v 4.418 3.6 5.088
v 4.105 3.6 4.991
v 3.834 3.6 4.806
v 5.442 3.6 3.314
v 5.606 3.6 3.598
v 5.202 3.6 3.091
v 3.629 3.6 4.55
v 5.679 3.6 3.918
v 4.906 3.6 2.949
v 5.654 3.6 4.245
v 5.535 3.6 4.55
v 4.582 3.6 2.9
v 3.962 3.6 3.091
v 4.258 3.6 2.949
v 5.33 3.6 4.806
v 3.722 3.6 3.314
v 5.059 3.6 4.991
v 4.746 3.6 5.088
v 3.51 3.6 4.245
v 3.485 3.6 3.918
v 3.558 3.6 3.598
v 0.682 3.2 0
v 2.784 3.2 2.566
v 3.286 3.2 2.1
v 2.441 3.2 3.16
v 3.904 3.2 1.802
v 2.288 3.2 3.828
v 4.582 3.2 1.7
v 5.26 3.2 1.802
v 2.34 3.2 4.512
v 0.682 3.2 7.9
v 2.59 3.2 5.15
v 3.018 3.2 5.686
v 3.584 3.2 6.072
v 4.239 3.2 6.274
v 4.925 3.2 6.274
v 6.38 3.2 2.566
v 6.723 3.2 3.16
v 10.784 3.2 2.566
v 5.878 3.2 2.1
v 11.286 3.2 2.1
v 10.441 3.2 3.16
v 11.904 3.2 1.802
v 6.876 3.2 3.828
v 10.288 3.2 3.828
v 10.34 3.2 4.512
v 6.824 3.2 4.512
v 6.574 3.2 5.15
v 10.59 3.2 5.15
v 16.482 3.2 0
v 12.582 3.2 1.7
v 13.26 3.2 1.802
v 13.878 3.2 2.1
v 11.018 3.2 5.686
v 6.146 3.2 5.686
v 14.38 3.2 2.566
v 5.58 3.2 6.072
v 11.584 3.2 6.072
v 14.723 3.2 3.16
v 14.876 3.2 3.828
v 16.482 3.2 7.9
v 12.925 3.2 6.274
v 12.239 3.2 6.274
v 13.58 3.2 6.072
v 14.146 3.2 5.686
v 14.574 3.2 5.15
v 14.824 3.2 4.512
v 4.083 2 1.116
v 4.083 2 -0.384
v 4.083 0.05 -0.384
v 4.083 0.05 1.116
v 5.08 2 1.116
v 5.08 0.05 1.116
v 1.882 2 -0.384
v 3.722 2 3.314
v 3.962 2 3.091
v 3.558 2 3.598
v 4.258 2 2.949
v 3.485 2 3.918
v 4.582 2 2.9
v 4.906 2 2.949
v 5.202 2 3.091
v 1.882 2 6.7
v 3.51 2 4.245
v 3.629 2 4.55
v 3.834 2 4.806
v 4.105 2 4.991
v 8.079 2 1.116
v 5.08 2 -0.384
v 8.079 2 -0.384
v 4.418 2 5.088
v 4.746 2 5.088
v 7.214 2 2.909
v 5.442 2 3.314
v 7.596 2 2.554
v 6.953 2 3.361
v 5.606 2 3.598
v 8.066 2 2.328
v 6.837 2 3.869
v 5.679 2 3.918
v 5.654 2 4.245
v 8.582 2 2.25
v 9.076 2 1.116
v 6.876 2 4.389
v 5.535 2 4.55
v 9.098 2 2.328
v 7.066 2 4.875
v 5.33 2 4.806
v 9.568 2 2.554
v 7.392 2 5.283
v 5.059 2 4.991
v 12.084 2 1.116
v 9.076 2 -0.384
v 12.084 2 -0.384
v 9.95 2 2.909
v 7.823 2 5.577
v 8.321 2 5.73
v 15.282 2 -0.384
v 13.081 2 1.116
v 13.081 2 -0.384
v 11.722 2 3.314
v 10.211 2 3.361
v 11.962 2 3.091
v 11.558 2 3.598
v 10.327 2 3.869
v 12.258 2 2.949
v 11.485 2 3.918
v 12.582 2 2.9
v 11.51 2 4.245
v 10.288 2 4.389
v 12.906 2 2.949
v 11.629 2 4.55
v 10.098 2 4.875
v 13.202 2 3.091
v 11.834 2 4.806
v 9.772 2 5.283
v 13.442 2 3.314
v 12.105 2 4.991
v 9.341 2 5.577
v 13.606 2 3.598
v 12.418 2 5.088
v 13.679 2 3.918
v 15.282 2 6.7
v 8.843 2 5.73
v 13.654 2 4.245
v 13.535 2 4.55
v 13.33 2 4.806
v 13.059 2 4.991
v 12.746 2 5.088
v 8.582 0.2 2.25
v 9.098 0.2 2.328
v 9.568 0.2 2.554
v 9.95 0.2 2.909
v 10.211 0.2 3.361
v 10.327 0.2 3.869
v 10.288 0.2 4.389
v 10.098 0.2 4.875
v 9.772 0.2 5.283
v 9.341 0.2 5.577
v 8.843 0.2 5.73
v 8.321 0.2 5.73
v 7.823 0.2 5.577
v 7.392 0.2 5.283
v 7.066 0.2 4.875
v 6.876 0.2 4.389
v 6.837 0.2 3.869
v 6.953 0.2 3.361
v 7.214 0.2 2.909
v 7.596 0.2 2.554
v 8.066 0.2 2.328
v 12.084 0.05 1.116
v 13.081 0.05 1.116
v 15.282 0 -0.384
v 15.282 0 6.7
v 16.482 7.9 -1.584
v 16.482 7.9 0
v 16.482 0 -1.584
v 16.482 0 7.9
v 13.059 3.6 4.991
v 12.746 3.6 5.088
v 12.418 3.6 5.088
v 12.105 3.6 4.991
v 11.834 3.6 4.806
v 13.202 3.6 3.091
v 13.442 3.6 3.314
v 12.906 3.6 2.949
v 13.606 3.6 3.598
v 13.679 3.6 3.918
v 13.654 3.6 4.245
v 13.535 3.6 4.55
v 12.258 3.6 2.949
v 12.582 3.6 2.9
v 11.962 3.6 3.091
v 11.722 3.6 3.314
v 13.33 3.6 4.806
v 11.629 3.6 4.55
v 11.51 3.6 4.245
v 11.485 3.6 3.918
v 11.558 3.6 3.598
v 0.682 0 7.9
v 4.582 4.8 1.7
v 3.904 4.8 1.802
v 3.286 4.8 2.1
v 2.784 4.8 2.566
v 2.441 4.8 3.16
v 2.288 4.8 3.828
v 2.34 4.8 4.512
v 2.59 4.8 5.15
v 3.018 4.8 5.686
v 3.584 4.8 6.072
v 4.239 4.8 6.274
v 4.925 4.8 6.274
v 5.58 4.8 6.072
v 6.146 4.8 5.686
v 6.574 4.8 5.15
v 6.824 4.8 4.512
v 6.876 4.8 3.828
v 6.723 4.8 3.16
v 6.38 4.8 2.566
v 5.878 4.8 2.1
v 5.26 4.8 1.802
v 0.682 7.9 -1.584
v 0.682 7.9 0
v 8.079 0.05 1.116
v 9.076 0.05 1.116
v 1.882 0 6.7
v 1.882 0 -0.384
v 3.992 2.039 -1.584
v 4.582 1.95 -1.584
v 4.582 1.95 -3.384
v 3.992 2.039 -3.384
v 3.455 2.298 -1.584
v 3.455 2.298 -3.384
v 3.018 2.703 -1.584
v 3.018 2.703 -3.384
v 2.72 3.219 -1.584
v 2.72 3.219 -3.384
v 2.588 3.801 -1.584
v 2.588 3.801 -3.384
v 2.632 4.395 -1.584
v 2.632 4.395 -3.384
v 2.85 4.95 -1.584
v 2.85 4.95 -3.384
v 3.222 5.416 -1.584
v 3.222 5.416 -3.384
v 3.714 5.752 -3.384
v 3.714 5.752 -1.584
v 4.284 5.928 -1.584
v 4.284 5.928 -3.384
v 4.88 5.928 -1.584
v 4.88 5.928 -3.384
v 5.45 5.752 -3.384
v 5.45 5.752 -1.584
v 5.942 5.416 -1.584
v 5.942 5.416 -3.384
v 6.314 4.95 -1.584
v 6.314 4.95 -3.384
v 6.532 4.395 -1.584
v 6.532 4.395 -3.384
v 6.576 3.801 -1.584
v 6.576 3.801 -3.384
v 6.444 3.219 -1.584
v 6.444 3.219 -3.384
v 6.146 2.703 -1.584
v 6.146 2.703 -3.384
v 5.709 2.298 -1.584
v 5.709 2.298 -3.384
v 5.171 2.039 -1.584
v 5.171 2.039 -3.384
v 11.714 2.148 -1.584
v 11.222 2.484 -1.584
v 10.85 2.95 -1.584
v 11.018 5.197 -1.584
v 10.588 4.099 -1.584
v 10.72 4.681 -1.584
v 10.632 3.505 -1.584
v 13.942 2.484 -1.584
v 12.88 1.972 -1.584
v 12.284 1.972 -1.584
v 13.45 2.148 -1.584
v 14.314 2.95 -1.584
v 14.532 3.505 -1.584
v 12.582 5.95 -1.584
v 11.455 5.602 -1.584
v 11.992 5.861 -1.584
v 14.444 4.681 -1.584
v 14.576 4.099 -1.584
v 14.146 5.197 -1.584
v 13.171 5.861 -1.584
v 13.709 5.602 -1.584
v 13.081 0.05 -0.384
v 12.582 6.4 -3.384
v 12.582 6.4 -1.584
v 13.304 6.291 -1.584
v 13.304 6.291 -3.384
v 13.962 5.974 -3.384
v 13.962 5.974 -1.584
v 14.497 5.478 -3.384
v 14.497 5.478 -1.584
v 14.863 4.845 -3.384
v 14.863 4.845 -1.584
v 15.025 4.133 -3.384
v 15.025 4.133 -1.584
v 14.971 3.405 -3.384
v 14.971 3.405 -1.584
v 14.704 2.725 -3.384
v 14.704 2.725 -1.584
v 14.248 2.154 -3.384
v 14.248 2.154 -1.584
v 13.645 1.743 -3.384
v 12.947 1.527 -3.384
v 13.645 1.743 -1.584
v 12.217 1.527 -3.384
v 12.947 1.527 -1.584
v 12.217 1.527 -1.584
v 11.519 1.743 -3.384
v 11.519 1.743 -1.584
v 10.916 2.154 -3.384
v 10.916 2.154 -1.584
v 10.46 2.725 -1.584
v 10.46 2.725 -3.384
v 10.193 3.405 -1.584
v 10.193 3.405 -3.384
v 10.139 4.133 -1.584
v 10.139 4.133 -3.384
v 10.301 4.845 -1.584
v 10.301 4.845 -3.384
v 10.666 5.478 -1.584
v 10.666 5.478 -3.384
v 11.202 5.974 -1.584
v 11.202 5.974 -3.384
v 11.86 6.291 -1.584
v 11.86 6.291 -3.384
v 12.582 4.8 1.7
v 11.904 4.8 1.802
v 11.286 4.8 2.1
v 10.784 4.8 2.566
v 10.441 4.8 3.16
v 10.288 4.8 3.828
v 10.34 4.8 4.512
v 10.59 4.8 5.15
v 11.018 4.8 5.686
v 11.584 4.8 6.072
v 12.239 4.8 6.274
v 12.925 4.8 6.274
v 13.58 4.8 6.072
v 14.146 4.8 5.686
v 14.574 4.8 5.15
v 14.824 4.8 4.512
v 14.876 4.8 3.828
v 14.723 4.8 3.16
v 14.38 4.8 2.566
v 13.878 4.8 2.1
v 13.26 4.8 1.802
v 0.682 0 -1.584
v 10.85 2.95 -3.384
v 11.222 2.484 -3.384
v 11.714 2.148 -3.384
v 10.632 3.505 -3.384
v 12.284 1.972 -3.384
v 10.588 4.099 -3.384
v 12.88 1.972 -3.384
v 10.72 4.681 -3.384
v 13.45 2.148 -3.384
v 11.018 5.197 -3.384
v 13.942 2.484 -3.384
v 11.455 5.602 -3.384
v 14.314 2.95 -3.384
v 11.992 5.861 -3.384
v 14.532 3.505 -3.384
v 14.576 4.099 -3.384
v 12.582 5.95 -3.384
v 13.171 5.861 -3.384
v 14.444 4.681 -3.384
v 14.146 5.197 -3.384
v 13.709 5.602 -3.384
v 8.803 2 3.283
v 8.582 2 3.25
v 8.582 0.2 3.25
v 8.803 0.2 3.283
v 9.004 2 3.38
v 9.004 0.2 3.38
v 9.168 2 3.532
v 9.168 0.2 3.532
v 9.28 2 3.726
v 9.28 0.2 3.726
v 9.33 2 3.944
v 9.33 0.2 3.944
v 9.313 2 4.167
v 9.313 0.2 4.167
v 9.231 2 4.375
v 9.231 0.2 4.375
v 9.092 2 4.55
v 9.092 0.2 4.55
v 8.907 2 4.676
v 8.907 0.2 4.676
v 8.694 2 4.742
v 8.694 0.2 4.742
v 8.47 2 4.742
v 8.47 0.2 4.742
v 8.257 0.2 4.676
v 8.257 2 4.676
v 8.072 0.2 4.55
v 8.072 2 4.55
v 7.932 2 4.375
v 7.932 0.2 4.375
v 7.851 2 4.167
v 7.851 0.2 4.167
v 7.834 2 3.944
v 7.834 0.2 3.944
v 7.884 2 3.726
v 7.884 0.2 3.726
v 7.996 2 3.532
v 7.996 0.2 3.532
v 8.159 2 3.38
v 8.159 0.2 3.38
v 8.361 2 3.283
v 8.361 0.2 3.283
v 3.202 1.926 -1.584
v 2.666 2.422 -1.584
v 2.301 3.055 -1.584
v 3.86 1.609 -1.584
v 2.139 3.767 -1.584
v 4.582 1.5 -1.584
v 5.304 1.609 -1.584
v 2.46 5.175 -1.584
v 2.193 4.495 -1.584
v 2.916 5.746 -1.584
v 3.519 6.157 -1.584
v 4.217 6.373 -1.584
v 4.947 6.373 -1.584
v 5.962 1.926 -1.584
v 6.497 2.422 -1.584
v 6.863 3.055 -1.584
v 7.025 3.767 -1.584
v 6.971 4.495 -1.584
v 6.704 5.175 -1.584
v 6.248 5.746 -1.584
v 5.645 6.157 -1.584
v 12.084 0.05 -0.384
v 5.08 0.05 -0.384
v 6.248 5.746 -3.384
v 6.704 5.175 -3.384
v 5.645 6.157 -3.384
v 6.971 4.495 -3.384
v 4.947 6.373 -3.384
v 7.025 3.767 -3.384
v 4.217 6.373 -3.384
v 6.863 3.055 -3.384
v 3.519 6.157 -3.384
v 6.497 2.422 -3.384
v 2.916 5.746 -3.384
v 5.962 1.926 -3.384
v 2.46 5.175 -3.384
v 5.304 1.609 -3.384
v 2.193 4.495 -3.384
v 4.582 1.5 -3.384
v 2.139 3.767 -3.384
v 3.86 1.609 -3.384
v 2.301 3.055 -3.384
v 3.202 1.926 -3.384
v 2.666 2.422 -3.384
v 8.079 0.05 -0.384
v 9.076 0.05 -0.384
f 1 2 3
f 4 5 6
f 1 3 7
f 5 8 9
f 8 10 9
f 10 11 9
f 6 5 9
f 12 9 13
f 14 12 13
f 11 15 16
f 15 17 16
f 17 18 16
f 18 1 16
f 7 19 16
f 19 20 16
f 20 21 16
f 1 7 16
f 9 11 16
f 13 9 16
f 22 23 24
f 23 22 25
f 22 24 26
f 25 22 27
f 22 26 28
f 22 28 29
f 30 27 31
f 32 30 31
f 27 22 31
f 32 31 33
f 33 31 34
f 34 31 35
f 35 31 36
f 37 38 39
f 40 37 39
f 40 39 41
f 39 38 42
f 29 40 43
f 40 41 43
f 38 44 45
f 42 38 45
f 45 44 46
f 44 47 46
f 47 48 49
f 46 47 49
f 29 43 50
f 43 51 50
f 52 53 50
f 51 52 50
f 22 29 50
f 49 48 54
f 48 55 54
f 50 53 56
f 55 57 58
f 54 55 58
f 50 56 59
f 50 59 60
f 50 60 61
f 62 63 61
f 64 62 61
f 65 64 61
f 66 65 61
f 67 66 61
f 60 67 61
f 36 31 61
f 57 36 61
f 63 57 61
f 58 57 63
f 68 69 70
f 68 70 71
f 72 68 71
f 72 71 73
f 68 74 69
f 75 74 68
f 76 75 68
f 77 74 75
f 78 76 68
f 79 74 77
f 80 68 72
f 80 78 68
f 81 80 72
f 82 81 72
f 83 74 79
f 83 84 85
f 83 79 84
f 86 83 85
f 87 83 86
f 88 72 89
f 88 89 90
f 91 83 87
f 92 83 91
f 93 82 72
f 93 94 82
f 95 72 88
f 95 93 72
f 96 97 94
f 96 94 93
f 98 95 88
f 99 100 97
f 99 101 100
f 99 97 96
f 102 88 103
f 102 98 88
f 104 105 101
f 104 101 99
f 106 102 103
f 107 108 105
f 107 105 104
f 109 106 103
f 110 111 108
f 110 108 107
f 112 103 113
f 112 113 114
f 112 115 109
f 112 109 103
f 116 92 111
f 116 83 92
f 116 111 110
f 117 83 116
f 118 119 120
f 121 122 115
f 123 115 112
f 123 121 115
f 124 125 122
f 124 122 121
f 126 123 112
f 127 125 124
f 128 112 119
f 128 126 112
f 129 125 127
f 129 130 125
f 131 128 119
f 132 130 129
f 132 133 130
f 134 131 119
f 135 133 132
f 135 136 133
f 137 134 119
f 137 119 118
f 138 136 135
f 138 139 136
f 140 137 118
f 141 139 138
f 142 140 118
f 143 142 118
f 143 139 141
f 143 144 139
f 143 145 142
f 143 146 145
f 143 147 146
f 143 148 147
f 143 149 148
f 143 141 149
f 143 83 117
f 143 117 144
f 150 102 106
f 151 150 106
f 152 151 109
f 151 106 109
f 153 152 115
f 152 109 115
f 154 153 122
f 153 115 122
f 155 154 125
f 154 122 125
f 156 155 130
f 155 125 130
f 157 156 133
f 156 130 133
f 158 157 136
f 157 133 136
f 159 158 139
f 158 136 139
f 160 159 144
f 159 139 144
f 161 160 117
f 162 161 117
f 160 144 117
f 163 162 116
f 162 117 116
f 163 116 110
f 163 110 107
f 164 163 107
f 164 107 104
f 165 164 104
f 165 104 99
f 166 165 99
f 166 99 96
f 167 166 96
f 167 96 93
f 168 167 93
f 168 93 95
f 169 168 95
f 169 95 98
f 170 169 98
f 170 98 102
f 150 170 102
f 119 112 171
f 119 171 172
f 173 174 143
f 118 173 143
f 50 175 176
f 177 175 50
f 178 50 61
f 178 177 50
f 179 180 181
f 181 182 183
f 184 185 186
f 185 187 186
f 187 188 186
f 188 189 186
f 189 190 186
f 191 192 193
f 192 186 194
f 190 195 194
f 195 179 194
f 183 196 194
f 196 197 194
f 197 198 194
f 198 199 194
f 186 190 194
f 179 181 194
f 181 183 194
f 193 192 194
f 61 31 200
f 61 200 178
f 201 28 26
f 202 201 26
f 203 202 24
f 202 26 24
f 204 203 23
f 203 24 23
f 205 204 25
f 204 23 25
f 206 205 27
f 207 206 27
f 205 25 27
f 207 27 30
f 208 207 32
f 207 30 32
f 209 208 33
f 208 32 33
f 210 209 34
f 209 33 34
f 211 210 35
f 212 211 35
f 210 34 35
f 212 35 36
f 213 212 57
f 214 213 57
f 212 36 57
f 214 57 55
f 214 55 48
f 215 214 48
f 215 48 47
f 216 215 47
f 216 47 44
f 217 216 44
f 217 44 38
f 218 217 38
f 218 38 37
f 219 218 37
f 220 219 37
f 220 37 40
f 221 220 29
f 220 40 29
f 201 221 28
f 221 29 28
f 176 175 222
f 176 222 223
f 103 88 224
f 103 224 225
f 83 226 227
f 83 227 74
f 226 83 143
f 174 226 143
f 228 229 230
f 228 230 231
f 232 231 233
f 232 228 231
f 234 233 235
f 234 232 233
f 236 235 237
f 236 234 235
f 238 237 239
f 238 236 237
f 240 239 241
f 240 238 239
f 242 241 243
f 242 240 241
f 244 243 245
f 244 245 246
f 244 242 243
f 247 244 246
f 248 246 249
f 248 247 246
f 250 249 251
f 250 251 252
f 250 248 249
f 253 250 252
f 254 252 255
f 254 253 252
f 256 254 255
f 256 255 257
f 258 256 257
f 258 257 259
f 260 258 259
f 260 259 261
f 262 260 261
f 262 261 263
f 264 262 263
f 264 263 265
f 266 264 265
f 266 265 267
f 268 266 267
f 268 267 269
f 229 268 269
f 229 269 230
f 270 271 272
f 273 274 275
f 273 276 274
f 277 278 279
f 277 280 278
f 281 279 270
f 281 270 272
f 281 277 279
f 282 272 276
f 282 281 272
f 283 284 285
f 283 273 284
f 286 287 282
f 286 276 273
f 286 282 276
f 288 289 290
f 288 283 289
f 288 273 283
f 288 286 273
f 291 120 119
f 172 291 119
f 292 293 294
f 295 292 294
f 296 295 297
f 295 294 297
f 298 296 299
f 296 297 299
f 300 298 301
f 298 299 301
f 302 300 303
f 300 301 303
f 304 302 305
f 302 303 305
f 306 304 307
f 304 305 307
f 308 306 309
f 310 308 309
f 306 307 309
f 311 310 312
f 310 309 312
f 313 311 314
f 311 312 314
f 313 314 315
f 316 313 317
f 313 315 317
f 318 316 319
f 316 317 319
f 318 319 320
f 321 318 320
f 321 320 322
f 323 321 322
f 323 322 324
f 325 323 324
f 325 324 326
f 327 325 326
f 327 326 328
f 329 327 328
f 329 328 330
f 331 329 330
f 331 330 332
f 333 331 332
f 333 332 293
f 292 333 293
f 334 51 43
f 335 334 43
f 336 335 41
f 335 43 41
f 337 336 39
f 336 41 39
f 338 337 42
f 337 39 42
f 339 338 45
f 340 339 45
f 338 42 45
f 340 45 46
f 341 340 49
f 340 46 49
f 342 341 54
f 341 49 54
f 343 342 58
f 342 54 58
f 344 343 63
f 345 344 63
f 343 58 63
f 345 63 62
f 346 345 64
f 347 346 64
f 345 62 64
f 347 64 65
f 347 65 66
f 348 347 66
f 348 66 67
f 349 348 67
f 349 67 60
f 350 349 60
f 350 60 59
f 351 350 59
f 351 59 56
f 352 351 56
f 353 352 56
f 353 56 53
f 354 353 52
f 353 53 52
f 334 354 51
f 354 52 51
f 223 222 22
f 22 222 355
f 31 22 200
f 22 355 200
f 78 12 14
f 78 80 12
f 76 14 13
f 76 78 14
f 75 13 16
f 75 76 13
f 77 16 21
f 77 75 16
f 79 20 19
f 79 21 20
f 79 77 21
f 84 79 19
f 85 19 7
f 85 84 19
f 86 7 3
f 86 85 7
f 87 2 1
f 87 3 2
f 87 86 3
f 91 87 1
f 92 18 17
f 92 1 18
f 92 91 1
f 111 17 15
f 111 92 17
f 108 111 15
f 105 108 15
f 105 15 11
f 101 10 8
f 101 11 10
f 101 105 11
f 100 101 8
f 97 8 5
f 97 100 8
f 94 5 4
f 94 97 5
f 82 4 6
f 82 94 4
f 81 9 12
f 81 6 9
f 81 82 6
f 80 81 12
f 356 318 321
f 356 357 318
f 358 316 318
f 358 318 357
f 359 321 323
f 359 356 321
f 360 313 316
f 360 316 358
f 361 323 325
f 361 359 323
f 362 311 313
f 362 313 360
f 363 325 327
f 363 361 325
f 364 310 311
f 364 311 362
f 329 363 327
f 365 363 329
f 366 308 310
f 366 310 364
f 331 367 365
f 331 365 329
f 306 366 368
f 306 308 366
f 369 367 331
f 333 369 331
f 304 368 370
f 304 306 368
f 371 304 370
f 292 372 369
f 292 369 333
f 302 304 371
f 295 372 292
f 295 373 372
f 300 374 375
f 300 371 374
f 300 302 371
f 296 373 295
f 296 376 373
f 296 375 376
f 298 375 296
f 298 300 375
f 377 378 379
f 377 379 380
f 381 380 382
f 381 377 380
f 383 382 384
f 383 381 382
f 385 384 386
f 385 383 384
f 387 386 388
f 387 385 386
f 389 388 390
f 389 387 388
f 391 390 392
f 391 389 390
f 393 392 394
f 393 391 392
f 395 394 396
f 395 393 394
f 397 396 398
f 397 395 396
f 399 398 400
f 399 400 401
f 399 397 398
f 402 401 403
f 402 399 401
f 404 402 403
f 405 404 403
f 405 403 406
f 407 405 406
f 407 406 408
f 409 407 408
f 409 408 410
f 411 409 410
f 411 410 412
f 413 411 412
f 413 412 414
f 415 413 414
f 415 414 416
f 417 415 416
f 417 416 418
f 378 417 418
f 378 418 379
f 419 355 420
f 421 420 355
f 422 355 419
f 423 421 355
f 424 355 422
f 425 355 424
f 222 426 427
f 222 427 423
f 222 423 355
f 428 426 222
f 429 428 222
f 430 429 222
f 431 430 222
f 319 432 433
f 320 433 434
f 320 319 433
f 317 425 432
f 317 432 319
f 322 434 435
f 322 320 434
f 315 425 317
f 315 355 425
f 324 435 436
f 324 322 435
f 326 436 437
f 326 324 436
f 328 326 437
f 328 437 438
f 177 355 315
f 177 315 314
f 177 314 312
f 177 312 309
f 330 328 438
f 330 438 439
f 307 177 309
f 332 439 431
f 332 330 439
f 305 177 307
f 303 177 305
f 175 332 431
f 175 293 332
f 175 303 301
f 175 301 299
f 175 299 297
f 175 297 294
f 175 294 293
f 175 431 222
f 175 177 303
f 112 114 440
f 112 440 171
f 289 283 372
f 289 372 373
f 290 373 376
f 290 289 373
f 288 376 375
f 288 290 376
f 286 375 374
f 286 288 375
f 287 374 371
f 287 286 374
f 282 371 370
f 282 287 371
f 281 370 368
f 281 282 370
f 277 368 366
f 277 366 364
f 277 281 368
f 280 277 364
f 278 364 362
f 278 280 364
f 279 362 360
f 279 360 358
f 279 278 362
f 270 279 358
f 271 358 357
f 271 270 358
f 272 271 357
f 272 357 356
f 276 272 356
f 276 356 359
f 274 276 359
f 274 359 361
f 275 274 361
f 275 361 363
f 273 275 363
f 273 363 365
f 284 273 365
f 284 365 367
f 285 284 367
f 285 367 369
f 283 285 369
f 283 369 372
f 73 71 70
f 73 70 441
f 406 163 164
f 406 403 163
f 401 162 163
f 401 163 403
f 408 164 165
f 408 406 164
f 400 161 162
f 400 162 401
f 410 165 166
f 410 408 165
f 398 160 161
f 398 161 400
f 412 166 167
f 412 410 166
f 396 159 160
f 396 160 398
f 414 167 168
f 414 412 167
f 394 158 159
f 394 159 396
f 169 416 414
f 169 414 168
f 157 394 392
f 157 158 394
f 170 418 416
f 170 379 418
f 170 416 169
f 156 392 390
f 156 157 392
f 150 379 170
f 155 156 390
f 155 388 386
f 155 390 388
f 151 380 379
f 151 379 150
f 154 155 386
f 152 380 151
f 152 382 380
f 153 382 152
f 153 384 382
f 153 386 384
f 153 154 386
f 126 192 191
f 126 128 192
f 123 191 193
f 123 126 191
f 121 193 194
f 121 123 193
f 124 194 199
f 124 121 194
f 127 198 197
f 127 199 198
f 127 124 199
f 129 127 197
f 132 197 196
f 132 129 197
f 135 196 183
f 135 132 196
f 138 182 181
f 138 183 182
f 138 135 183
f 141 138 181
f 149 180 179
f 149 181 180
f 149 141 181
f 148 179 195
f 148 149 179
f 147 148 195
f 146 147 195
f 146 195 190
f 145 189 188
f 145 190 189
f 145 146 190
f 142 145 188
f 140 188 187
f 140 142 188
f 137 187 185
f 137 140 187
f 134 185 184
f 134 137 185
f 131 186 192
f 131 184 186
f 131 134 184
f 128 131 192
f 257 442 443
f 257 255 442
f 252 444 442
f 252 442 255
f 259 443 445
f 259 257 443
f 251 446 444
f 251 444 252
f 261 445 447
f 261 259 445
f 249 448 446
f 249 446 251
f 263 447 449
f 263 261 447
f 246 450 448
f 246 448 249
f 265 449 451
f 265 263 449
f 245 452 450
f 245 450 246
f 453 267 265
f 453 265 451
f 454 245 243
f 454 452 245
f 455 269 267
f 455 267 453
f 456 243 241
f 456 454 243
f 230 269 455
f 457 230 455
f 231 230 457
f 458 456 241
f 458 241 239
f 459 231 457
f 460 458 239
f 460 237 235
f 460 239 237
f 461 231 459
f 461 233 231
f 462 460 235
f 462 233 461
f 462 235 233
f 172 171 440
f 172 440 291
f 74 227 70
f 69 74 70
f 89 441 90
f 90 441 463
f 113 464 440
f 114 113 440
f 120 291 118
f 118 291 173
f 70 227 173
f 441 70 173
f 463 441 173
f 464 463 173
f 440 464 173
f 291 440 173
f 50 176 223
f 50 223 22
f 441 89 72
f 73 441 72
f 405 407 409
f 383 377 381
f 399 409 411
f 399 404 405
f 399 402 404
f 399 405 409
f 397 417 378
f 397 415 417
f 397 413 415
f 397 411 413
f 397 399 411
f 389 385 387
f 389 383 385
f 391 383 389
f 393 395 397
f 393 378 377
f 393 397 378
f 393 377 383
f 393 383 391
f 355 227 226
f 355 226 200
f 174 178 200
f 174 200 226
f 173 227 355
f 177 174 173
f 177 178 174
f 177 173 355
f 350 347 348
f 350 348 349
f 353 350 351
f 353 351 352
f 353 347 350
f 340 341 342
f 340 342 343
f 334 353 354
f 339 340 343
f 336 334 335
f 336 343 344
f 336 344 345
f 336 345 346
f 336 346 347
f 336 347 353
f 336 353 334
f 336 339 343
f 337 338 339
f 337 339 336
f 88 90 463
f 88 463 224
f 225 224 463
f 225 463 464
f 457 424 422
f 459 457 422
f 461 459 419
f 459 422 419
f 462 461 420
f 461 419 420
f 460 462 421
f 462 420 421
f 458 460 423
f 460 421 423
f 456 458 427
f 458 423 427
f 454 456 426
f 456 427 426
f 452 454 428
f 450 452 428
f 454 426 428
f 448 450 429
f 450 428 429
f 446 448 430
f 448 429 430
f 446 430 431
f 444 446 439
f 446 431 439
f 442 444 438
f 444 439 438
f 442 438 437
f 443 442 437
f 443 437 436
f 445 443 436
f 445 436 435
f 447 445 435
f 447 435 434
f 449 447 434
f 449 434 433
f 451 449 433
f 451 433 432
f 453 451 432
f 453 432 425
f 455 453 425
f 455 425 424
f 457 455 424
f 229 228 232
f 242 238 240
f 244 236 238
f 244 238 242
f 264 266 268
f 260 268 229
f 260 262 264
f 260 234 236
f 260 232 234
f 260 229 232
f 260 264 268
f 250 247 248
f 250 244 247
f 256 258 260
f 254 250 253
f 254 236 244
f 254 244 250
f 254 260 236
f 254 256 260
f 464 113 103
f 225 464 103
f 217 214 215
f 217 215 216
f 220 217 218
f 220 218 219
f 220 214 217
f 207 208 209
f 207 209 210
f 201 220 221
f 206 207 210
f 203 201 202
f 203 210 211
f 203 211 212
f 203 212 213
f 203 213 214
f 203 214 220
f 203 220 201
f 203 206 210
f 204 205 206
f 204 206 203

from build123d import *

# Parameters (mm, degrees)
MAINBASESKETCH_W             = 15.8
MAINBASESKETCH_H             = 3.2
MAINBASEEXTRUDE_DEPTH        = 7.9
STUDSSKETCH_R                = 2.3
STUDSEXTRUDE_DEPTH           = 1.6
STUDSPATTERN_COUNT           = 2
STUDSPATTERN_PITCH           = 8
STUDSPATTERN_COUNT_DIR2      = 2
STUDSPATTERN_PITCH_DIR2      = 8
MAINBASESHELL_T              = -1.2
LCUTBLUE_DEPTH               = 19.555463972
LCUTBLUE_DEPTH_BACK          = 19.555463972
CUTADDEDTOLCUT_DEPTH         = 2
MADESLIMCUTSKETCH_W          = 7.9
MADESLIMCUTSKETCH_H          = 7.9
MADESLIMCUT_DEPTH            = 19.897228453
MADESLIMFILLEXT_REACH        = 20.897
SKETCH33_W                   = 5.500952983
SKETCH33_H                   = 1.199047018
SLIMHOLEEXT_START            = -0.2
SLIMHOLESKETCH_R             = 1.75
SLIMHOLESKETCH_R_2           = 0.75
SLIMHOLEEXT_DEPTH            = 2
SHORTLEXTENSIONSKETCH_W      = 1.583745828
SHORTLEXTENSIONSKETCH_H      = 7.9
SHORTLEXTENDEDCUTSKETCH_W    = 13.4
SHORTLEXTENDEDCUTSKETCH_H    = 1.582792846
SHORTLEXTENDEDCUT_DEPTH      = 2
SHORTLUNDERSTUMPS_START      = -0.2
SHORTLUNDERSTUMPSKETCH_W     = 0.996828098
SHORTLUNDERSTUMPSKETCH_H     = 1.5
SHORTLUNDERSTUMPS_DEPTH      = 2.15
SHORTLUPPERCIRCLES_START     = -0.2
SHORTLUPPERCIRCLESSKETCH_R   = 2.45
SHORTLUPPERCIRCLESSKETCH_R_2 = 2
SHORTLUPPERCIRCLES_DEPTH     = 2


with BuildPart() as part:
    # MainBaseSketch → MainBaseExtrude (new, symmetric)
    with BuildSketch(Plane.XY):
        with Locations((8.581967213, 1.6)):
            Rectangle(MAINBASESKETCH_W, MAINBASESKETCH_H)
    extrude(amount=MAINBASEEXTRUDE_DEPTH, both=True)

    # StudsSketch → StudsExtrude (add)
    with BuildSketch(Plane(origin=(0, 3.2, 0), x_dir=(1, 0, 0), z_dir=(0, 1, 0))):
        with Locations(Location((4.581967213, 4, 0), (0, 0, 90))):
            Circle(STUDSSKETCH_R)
    studsextrude = extrude(amount=STUDSEXTRUDE_DEPTH)

    # StudsPattern: StudsExtrude 2 × 2
    with Locations(*[(j * STUDSPATTERN_PITCH_DIR2, 0, i * STUDSPATTERN_PITCH) for i in range(STUDSPATTERN_COUNT) for j in range(STUDSPATTERN_COUNT_DIR2) if (i, j) != (0, 0)]):
        add(studsextrude)

    # MainBaseShell
    mainbaseshell_openings = [part.faces().sort_by_distance(p)[0] for p in [
        (8.581967213, 0, 0),
    ]]
    offset(amount=MAINBASESHELL_T, openings=mainbaseshell_openings, kind=Kind.INTERSECTION)

    # LCUTBlueSketch → LCutBlue (cut, two sides: drawn at the far end of the back side and taken through both)
    with BuildSketch(Plane(origin=(0, 3.2, 0), x_dir=(1, 0, 0), z_dir=(0, 1, 0)).offset(-LCUTBLUE_DEPTH_BACK)):
        Polygon((8.581967213, 53.229874044), (8.581967213, 7.9), (8.581967213, 0), (16.481967213, 0), (61.811841258, 0), (125.917963912, 64.106122654), (72.688089868, 117.335996699), align=None)
    extrude(amount=LCUTBLUE_DEPTH + LCUTBLUE_DEPTH_BACK, mode=Mode.SUBTRACT)

    # CutAddedtoLSketch → CutAddedToLCut (add)
    with BuildSketch(Plane.XZ):
        Polygon((7.382920196, -6.7), (8.581967213, -6.7), (8.581967213, 0), (15.281967213, 0), (15.281967213, 1.199047018), (7.382920196, 1.199047018), (7.382920196, 0), align=None)
    extrude(amount=-CUTADDEDTOLCUT_DEPTH)

    # MadeSlimCutSketch → MadeSlimCut (cut, through all)
    with BuildSketch(Plane.XZ):
        with Locations((4.631967213, -3.95)):
            Rectangle(MADESLIMCUTSKETCH_W, MADESLIMCUTSKETCH_H)
    extrude(amount=-MADESLIMCUT_DEPTH, mode=Mode.SUBTRACT)

    # Sketch33 → MadeSlimFillExt (add, up to next)
    with BuildSketch(Plane.XZ, mode=Mode.PRIVATE) as madeslimfillext_sk1:
        with Locations((4.632443704, 0.599523509)):
            Rectangle(SKETCH33_W, SKETCH33_H)
    madeslimfillext_tool1 = extrude(madeslimfillext_sk1.sketch, amount=-MADESLIMFILLEXT_REACH, mode=Mode.PRIVATE) - part.part
    add(madeslimfillext_tool1.solids().sort_by_distance((4.632444, 0, 0.599524))[0])

    # SlimHoleSketch → SlimHoleExt (add)
    with BuildSketch(Plane.XZ.offset(-2).offset(SLIMHOLEEXT_START)):
        with Locations(Location((8.581967213, 4, 0), (0, 0, 270))):
            Circle(SLIMHOLESKETCH_R)
        with Locations(Location((8.581967213, 4, 0), (0, 0, 270))):
            Circle(SLIMHOLESKETCH_R_2, mode=Mode.SUBTRACT)
    extrude(amount=SLIMHOLEEXT_DEPTH)

    # ShortLExtension: sweep along a curve in space
    with BuildLine() as shortlextension_path:
        Line((0.681967213, 3.2, 0), (16.481967213, 3.2, 0))
    # ShortLExtensionSketch → ShortLExtension (sweep)
    with BuildSketch(Plane(origin=(16.481967213, 0, 0), x_dir=(0, 0, -1), z_dir=(1, 0, 0))):
        with Locations((0.791872914, 3.95)):
            Rectangle(SHORTLEXTENSIONSKETCH_W, SHORTLEXTENSIONSKETCH_H)
    sweep(path=shortlextension_path.line)

    # ShortLExtendedCutSketch → ShortLExtendedCut (cut)
    with BuildSketch(Plane.XZ):
        with Locations((8.581967213, 0.407650595)):
            Rectangle(SHORTLEXTENDEDCUTSKETCH_W, SHORTLEXTENDEDCUTSKETCH_H)
    extrude(amount=-SHORTLEXTENDEDCUT_DEPTH, mode=Mode.SUBTRACT)

    # ShortLUnderStumpSketch → ShortLUnderStumps (add)
    with BuildSketch(Plane.XZ.offset(-2).offset(SHORTLUNDERSTUMPS_START)):
        with Locations((4.581764801, 0.366254172)):
            Rectangle(SHORTLUNDERSTUMPSKETCH_W, SHORTLUNDERSTUMPSKETCH_H)
        with Locations((8.57767054, 0.366254172)):
            Rectangle(SHORTLUNDERSTUMPSKETCH_W, SHORTLUNDERSTUMPSKETCH_H)
        with Locations((12.582169625, 0.366254172)):
            Rectangle(SHORTLUNDERSTUMPSKETCH_W, SHORTLUNDERSTUMPSKETCH_H)
    extrude(amount=SHORTLUNDERSTUMPS_DEPTH)

    # ShortLUpperCirclesSketch → ShortLUpperCircles (add)
    # profile 1 of 2: a face of its own
    with BuildSketch(Plane(origin=(0, 0, -1.583745828), x_dir=(-1, 0, 0), z_dir=(0, 0, -1)).offset(SHORTLUPPERCIRCLES_START)):
        with Locations(Location((-12.581967213, 3.95, 0), (0, 0, 90))):
            Circle(SHORTLUPPERCIRCLESSKETCH_R)
        with Locations(Location((-12.581967213, 3.95, 0), (0, 0, 90))):
            Circle(SHORTLUPPERCIRCLESSKETCH_R_2, mode=Mode.SUBTRACT)
    # profile 2 of 2: a face of its own
    with BuildSketch(Plane(origin=(0, 0, -1.583745828), x_dir=(-1, 0, 0), z_dir=(0, 0, -1)).offset(SHORTLUPPERCIRCLES_START)):
        with Locations(Location((-4.581967213, 3.95, 0), (0, 0, 270))):
            Circle(SHORTLUPPERCIRCLESSKETCH_R)
        with Locations(Location((-4.581967213, 3.95, 0), (0, 0, 270))):
            Circle(SHORTLUPPERCIRCLESSKETCH_R_2, mode=Mode.SUBTRACT)
    extrude(amount=SHORTLUPPERCIRCLES_DEPTH)


solid = part.part
